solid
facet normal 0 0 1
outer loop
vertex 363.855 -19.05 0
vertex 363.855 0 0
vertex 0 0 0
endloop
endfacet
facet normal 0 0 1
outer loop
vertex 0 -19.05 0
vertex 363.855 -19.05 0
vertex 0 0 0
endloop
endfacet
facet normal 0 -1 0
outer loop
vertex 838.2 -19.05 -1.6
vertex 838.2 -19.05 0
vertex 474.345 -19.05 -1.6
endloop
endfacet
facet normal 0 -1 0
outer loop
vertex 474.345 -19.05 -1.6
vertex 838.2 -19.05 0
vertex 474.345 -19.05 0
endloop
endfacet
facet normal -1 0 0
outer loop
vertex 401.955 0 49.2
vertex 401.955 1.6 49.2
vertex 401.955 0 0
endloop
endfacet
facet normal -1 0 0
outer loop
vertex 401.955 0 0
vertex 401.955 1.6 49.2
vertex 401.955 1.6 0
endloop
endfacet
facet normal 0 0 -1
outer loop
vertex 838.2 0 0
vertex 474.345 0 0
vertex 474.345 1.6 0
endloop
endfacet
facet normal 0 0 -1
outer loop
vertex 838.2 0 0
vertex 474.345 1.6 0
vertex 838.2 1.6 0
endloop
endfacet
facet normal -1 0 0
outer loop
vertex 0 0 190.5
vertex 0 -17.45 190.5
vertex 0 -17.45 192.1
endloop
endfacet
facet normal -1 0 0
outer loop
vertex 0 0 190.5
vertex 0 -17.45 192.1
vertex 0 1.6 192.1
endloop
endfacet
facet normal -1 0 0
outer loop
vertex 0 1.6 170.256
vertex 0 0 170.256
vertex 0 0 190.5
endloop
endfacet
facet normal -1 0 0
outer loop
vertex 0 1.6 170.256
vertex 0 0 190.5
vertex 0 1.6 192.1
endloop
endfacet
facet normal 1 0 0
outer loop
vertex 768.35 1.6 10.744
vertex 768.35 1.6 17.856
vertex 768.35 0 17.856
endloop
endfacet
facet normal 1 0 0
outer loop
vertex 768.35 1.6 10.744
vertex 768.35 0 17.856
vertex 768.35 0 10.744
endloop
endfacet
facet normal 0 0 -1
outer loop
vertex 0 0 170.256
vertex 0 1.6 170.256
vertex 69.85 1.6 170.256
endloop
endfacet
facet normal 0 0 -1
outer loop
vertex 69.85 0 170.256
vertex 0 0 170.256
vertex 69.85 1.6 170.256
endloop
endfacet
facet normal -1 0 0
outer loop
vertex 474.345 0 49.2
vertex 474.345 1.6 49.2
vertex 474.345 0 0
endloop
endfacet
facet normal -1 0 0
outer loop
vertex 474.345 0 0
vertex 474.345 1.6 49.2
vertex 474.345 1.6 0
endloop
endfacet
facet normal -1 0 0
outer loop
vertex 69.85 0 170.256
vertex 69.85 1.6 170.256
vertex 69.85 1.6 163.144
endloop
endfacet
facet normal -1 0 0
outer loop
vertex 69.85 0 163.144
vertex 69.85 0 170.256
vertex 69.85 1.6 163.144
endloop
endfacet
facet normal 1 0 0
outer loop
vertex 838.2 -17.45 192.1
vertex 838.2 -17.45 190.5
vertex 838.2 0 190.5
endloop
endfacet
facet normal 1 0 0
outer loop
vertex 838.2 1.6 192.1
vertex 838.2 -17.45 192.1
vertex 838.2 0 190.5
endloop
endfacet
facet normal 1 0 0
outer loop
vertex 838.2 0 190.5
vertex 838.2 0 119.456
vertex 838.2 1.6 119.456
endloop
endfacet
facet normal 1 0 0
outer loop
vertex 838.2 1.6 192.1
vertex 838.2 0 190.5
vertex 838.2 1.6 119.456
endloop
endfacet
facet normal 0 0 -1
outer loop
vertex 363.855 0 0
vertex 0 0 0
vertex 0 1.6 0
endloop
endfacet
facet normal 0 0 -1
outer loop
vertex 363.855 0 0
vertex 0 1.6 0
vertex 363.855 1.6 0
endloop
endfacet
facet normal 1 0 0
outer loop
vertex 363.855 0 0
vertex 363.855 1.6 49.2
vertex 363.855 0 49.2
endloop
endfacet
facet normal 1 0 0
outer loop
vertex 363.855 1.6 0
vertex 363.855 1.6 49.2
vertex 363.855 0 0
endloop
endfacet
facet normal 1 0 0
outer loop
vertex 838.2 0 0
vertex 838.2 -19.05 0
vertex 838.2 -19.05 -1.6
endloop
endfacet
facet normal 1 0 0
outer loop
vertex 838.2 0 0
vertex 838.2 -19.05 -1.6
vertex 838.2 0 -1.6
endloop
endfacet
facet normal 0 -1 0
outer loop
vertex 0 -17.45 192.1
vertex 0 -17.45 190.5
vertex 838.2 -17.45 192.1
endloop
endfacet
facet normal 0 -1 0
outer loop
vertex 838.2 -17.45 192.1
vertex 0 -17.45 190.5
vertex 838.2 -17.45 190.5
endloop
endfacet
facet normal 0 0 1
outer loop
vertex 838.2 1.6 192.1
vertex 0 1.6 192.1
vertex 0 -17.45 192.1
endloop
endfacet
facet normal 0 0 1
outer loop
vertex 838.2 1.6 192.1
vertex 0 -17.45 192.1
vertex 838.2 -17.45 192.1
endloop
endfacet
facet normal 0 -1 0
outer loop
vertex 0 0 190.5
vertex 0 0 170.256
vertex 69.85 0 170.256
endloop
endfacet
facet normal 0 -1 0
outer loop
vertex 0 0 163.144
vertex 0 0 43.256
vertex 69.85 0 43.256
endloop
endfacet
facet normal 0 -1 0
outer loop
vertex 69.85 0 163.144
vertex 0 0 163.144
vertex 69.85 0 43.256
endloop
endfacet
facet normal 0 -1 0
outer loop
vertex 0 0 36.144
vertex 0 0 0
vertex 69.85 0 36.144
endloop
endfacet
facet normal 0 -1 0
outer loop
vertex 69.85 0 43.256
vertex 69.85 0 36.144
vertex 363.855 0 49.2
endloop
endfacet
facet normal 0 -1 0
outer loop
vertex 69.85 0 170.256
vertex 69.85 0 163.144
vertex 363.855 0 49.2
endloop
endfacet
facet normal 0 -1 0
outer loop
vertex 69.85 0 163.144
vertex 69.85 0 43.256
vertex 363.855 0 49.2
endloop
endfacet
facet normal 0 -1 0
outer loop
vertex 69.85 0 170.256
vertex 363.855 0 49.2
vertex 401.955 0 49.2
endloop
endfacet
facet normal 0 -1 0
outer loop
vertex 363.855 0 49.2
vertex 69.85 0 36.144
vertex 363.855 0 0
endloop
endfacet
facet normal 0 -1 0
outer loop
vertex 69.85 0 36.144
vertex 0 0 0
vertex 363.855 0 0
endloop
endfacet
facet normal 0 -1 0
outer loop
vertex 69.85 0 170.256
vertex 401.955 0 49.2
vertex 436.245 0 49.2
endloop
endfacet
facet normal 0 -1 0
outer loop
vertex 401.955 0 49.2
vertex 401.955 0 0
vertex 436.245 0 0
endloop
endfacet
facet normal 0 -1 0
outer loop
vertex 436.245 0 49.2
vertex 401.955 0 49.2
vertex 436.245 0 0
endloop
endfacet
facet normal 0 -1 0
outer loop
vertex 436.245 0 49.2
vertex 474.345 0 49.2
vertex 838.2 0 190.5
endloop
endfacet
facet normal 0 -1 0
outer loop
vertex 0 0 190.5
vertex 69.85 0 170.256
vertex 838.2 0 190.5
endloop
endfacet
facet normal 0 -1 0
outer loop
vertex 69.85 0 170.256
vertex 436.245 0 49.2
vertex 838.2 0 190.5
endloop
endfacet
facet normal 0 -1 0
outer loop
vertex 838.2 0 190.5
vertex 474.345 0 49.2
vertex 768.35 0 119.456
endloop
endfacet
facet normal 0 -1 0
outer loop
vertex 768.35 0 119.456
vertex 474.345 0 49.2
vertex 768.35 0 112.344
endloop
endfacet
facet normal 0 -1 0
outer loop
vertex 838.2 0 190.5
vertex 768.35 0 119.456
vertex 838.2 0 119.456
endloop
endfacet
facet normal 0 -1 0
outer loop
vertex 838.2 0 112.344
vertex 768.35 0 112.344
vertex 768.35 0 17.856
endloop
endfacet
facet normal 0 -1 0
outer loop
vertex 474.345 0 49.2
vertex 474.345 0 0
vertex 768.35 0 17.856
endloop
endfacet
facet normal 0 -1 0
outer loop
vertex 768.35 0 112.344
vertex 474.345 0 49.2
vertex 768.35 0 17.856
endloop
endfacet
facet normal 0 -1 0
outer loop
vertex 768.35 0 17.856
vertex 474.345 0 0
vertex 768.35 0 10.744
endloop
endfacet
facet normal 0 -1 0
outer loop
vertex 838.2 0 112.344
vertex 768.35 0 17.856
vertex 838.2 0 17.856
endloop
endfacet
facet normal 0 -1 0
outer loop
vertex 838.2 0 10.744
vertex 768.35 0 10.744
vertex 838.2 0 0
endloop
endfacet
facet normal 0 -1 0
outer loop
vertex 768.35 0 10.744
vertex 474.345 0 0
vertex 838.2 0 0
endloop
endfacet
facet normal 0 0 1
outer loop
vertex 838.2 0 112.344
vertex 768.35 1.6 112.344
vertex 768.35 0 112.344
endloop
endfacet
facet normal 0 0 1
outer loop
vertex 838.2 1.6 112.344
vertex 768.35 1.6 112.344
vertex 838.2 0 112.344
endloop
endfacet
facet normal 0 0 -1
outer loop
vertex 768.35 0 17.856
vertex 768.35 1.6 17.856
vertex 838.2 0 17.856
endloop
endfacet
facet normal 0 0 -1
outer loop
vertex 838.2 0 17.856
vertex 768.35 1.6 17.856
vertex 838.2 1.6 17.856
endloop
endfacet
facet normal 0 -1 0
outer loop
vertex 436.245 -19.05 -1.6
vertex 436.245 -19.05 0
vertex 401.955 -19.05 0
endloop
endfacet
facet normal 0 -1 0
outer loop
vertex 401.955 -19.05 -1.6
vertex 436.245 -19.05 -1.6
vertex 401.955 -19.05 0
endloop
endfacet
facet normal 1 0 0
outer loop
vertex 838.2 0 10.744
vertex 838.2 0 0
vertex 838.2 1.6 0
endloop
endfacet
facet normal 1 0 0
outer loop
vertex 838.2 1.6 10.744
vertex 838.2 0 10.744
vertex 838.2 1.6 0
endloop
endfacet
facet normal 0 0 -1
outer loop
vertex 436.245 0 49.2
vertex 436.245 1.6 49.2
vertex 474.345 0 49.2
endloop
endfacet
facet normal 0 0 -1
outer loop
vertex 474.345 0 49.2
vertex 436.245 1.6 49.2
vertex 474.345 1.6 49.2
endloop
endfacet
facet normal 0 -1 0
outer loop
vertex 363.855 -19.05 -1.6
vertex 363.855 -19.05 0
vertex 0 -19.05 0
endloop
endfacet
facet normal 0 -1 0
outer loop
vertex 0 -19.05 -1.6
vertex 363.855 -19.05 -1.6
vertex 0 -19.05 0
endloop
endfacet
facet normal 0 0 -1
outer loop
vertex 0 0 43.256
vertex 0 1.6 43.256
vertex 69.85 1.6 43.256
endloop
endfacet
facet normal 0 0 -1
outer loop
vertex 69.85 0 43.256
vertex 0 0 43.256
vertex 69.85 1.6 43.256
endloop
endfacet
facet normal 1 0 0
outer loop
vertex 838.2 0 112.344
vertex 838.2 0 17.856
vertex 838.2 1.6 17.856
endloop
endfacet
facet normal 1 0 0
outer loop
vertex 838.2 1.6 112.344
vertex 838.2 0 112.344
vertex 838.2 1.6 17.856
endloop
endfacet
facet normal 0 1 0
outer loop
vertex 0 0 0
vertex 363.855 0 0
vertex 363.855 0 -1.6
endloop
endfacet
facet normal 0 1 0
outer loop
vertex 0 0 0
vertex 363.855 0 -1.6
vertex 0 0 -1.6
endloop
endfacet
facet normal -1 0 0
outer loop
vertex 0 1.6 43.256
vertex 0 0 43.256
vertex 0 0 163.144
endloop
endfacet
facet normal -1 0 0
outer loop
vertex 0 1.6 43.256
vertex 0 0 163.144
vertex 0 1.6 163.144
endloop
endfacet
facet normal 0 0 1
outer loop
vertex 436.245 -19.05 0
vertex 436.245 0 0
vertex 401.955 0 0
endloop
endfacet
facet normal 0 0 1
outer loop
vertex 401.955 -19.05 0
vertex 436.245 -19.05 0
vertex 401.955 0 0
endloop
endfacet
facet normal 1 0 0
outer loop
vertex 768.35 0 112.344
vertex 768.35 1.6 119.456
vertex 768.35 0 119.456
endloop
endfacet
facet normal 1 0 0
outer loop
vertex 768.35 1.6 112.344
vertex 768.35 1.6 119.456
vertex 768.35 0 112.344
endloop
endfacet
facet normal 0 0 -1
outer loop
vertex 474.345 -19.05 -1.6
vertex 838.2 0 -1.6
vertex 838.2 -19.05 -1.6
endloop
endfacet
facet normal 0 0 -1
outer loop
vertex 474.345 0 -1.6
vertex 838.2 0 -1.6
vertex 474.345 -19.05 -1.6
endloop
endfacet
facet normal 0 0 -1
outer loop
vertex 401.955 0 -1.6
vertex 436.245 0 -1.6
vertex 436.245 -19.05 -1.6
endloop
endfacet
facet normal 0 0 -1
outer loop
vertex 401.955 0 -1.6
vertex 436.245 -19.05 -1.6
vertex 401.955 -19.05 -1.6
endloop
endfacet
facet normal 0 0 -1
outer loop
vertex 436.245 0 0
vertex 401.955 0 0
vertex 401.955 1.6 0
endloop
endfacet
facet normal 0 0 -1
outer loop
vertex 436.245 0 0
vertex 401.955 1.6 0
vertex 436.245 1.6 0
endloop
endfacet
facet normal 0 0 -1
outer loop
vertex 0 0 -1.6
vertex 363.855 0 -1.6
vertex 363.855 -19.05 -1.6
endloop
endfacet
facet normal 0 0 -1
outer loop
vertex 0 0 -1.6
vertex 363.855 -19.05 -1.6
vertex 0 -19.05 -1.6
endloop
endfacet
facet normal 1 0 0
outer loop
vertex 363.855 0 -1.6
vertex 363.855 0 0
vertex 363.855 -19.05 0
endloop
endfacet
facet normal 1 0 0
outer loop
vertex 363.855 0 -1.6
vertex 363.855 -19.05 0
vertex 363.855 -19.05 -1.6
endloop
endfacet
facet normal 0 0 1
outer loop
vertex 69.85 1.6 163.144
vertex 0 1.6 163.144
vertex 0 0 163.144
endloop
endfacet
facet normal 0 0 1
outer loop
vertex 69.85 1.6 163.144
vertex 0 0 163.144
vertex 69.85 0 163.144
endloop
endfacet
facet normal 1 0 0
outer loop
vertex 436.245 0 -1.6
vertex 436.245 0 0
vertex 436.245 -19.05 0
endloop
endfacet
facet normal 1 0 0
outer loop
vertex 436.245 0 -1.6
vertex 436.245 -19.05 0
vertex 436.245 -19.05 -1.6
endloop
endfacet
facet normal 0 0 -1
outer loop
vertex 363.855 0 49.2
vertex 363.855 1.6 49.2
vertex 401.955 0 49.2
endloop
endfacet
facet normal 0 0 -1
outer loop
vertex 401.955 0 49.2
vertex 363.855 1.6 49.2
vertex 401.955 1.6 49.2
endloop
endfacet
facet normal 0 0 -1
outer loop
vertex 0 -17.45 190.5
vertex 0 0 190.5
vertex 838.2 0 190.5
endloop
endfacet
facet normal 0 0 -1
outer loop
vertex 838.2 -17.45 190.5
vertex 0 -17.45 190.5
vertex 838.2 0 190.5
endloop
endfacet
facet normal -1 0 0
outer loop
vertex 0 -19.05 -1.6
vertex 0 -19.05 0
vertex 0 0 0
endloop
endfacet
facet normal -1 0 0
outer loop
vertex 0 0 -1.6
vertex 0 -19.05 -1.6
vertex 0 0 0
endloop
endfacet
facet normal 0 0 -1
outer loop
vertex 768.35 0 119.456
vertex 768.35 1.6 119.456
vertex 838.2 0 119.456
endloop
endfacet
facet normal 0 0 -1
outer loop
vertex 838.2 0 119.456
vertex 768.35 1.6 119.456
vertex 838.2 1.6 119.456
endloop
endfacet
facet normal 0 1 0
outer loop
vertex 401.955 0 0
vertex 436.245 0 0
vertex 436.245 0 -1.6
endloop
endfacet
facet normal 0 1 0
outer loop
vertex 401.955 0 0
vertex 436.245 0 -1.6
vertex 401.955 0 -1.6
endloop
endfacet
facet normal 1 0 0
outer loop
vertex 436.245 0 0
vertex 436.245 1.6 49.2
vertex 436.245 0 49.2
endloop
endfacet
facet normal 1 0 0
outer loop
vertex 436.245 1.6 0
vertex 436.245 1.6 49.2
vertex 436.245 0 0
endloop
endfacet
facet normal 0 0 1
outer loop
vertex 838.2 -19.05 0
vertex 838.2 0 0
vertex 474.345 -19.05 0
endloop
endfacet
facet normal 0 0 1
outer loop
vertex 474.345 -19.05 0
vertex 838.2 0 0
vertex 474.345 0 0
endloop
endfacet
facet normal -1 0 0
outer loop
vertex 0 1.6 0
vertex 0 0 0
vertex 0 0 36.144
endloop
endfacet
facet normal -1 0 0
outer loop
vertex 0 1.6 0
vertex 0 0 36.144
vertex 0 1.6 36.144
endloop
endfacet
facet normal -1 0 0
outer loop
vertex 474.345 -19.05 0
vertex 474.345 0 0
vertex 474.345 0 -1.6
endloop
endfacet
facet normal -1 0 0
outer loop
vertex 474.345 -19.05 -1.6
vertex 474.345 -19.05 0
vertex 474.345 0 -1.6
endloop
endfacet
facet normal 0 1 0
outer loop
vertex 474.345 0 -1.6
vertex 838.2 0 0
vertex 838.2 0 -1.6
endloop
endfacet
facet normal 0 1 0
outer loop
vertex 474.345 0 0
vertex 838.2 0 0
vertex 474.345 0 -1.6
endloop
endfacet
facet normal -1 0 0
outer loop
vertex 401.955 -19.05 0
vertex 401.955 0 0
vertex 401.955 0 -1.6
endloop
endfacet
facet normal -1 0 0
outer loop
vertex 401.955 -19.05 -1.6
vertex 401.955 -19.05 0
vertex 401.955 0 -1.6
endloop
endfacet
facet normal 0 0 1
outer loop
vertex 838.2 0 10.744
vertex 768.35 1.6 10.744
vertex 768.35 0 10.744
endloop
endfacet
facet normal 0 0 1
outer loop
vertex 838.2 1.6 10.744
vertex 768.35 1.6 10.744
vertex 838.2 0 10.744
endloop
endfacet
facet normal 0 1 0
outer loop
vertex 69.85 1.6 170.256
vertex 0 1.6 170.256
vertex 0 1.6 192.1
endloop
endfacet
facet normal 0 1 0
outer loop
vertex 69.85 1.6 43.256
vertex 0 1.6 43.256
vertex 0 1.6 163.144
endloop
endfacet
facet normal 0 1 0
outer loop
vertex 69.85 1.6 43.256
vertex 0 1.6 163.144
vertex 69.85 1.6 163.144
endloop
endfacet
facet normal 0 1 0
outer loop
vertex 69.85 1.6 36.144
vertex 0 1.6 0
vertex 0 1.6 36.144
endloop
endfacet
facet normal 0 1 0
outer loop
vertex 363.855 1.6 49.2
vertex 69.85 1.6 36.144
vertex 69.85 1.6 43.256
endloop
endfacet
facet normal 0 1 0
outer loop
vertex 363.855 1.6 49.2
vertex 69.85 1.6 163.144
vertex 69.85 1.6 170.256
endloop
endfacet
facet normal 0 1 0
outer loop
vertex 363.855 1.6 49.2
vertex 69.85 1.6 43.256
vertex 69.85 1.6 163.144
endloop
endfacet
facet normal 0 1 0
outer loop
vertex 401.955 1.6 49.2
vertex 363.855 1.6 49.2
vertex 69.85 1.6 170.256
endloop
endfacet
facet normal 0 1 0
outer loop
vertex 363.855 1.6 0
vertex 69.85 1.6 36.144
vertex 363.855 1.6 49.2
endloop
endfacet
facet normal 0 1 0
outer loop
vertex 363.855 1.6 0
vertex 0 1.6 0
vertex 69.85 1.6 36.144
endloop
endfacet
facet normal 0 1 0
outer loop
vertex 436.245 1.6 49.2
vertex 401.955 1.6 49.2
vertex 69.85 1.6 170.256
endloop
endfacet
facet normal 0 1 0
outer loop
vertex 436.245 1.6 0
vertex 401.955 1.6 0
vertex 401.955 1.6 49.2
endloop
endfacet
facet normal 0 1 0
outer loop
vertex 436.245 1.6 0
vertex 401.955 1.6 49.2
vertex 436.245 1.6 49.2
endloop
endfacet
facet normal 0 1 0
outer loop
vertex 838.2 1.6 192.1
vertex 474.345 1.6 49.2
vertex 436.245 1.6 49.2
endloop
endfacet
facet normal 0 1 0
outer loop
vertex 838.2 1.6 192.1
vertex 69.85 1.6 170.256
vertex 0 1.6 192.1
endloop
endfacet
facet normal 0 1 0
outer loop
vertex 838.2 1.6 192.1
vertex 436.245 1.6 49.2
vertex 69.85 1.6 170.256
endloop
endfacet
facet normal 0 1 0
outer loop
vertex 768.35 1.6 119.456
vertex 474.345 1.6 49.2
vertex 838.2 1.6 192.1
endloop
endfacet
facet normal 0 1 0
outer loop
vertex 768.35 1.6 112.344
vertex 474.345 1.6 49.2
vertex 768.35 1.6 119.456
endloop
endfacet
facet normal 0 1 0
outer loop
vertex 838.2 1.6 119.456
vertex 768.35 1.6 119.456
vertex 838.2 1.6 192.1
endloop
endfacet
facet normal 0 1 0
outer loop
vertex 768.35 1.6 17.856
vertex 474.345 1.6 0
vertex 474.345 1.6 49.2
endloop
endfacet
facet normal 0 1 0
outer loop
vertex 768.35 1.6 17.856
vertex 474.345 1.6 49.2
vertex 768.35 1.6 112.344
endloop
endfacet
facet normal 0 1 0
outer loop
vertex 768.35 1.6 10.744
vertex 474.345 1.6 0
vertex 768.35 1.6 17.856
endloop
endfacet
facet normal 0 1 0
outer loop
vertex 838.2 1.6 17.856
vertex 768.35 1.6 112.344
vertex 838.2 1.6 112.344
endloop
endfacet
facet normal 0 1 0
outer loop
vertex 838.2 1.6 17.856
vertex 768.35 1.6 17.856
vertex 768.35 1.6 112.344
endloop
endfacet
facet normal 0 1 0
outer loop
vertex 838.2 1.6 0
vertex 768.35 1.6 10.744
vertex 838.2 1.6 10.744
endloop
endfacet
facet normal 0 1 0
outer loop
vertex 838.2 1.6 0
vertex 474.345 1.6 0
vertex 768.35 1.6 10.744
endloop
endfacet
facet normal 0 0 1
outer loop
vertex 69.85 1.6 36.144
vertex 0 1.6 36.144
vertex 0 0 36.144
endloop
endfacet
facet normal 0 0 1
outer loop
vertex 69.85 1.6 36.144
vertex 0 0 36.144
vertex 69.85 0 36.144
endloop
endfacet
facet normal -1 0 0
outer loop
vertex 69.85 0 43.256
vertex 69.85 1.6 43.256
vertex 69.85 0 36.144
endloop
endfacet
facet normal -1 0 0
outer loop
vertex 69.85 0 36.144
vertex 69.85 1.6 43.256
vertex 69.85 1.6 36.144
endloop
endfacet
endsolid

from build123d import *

# Parameters (mm, degrees)
SKETCH1_W           = 838.2
SKETCH1_H           = 190.5
BOSS_EXTRUDE1_DEPTH = 1.6002
SKETCH3_W           = 838.2
SKETCH3_H           = 19.05
BOSS_EXTRUDE2_DEPTH = 1.6002
SKETCH4_W           = 838.2
SKETCH4_H           = 19.05
BOSS_EXTRUDE3_DEPTH = 1.6002
SKETCH2_W           = 38.1
SKETCH2_H           = 50.8
CUT_EXTRUDE1_DEPTH  = 21.6502
SKETCH6_W           = 69.85
SKETCH6_H           = 7.112
CUT_EXTRUDE2_DEPTH  = 21.6502


with BuildPart() as part:
    # Sketch1 → Boss-Extrude1 (new body)
    with BuildSketch(Plane(origin=(0, 0, 0), x_dir=(1, 0, 0), z_dir=(0, 1, 0))):
        with Locations((419.1, -95.25)):
            Rectangle(SKETCH1_W, SKETCH1_H)
    extrude(amount=BOSS_EXTRUDE1_DEPTH)

    # Sketch3 → Boss-Extrude2 (add)
    with BuildSketch(Plane.XY.offset(190.5)):
        with Locations((419.1, -7.9248)):
            Rectangle(SKETCH3_W, SKETCH3_H)
    extrude(amount=BOSS_EXTRUDE2_DEPTH)


with BuildPart() as body_2:
    # Sketch4 → Boss-Extrude3 (new body)
    with BuildSketch(Plane(origin=(0, 0, 0), x_dir=(-1, 0, 0), z_dir=(0, 0, -1))):
        with Locations((-419.1, -9.525)):
            Rectangle(SKETCH4_W, SKETCH4_H)
    extrude(amount=BOSS_EXTRUDE3_DEPTH)


with BuildPart() as cut_extrude1_tool:
    # Sketch2 → Cut-Extrude1 (new body, through all)
    with BuildSketch(Plane(origin=(0, 1.6002, 0), x_dir=(1, 0, 0), z_dir=(0, 1, 0))):
        with Locations((382.905, -23.7998)):
            Rectangle(SKETCH2_W, SKETCH2_H)
        with Locations((455.295, -23.7998)):
            Rectangle(SKETCH2_W, SKETCH2_H)
    extrude(amount=-CUT_EXTRUDE1_DEPTH)


with BuildPart() as part_1:
    add(part.part)

    # Cut-Extrude1: cut by cut_extrude1_tool
    add(cut_extrude1_tool.part, mode=Mode.SUBTRACT)

    # Sketch6 → Cut-Extrude2 (cut, through all)
    with BuildSketch(Plane(origin=(0, 1.6002, 0), x_dir=(1, 0, 0), z_dir=(0, 1, 0))):
        with Locations((34.925, -39.7002)):
            Rectangle(SKETCH6_W, SKETCH6_H)
        with Locations((34.925, -166.7002)):
            Rectangle(SKETCH6_W, SKETCH6_H)
        with Locations((803.275, -14.3002)):
            Rectangle(SKETCH6_W, SKETCH6_H)
        with Locations((803.275, -115.9002)):
            Rectangle(SKETCH6_W, SKETCH6_H)
    extrude(amount=-CUT_EXTRUDE2_DEPTH, mode=Mode.SUBTRACT)


with BuildPart() as body_2_1:
    add(body_2.part)

    # Cut-Extrude1: cut by cut_extrude1_tool
    add(cut_extrude1_tool.part, mode=Mode.SUBTRACT)


solid = Compound([part_1.part, body_2_1.part])
